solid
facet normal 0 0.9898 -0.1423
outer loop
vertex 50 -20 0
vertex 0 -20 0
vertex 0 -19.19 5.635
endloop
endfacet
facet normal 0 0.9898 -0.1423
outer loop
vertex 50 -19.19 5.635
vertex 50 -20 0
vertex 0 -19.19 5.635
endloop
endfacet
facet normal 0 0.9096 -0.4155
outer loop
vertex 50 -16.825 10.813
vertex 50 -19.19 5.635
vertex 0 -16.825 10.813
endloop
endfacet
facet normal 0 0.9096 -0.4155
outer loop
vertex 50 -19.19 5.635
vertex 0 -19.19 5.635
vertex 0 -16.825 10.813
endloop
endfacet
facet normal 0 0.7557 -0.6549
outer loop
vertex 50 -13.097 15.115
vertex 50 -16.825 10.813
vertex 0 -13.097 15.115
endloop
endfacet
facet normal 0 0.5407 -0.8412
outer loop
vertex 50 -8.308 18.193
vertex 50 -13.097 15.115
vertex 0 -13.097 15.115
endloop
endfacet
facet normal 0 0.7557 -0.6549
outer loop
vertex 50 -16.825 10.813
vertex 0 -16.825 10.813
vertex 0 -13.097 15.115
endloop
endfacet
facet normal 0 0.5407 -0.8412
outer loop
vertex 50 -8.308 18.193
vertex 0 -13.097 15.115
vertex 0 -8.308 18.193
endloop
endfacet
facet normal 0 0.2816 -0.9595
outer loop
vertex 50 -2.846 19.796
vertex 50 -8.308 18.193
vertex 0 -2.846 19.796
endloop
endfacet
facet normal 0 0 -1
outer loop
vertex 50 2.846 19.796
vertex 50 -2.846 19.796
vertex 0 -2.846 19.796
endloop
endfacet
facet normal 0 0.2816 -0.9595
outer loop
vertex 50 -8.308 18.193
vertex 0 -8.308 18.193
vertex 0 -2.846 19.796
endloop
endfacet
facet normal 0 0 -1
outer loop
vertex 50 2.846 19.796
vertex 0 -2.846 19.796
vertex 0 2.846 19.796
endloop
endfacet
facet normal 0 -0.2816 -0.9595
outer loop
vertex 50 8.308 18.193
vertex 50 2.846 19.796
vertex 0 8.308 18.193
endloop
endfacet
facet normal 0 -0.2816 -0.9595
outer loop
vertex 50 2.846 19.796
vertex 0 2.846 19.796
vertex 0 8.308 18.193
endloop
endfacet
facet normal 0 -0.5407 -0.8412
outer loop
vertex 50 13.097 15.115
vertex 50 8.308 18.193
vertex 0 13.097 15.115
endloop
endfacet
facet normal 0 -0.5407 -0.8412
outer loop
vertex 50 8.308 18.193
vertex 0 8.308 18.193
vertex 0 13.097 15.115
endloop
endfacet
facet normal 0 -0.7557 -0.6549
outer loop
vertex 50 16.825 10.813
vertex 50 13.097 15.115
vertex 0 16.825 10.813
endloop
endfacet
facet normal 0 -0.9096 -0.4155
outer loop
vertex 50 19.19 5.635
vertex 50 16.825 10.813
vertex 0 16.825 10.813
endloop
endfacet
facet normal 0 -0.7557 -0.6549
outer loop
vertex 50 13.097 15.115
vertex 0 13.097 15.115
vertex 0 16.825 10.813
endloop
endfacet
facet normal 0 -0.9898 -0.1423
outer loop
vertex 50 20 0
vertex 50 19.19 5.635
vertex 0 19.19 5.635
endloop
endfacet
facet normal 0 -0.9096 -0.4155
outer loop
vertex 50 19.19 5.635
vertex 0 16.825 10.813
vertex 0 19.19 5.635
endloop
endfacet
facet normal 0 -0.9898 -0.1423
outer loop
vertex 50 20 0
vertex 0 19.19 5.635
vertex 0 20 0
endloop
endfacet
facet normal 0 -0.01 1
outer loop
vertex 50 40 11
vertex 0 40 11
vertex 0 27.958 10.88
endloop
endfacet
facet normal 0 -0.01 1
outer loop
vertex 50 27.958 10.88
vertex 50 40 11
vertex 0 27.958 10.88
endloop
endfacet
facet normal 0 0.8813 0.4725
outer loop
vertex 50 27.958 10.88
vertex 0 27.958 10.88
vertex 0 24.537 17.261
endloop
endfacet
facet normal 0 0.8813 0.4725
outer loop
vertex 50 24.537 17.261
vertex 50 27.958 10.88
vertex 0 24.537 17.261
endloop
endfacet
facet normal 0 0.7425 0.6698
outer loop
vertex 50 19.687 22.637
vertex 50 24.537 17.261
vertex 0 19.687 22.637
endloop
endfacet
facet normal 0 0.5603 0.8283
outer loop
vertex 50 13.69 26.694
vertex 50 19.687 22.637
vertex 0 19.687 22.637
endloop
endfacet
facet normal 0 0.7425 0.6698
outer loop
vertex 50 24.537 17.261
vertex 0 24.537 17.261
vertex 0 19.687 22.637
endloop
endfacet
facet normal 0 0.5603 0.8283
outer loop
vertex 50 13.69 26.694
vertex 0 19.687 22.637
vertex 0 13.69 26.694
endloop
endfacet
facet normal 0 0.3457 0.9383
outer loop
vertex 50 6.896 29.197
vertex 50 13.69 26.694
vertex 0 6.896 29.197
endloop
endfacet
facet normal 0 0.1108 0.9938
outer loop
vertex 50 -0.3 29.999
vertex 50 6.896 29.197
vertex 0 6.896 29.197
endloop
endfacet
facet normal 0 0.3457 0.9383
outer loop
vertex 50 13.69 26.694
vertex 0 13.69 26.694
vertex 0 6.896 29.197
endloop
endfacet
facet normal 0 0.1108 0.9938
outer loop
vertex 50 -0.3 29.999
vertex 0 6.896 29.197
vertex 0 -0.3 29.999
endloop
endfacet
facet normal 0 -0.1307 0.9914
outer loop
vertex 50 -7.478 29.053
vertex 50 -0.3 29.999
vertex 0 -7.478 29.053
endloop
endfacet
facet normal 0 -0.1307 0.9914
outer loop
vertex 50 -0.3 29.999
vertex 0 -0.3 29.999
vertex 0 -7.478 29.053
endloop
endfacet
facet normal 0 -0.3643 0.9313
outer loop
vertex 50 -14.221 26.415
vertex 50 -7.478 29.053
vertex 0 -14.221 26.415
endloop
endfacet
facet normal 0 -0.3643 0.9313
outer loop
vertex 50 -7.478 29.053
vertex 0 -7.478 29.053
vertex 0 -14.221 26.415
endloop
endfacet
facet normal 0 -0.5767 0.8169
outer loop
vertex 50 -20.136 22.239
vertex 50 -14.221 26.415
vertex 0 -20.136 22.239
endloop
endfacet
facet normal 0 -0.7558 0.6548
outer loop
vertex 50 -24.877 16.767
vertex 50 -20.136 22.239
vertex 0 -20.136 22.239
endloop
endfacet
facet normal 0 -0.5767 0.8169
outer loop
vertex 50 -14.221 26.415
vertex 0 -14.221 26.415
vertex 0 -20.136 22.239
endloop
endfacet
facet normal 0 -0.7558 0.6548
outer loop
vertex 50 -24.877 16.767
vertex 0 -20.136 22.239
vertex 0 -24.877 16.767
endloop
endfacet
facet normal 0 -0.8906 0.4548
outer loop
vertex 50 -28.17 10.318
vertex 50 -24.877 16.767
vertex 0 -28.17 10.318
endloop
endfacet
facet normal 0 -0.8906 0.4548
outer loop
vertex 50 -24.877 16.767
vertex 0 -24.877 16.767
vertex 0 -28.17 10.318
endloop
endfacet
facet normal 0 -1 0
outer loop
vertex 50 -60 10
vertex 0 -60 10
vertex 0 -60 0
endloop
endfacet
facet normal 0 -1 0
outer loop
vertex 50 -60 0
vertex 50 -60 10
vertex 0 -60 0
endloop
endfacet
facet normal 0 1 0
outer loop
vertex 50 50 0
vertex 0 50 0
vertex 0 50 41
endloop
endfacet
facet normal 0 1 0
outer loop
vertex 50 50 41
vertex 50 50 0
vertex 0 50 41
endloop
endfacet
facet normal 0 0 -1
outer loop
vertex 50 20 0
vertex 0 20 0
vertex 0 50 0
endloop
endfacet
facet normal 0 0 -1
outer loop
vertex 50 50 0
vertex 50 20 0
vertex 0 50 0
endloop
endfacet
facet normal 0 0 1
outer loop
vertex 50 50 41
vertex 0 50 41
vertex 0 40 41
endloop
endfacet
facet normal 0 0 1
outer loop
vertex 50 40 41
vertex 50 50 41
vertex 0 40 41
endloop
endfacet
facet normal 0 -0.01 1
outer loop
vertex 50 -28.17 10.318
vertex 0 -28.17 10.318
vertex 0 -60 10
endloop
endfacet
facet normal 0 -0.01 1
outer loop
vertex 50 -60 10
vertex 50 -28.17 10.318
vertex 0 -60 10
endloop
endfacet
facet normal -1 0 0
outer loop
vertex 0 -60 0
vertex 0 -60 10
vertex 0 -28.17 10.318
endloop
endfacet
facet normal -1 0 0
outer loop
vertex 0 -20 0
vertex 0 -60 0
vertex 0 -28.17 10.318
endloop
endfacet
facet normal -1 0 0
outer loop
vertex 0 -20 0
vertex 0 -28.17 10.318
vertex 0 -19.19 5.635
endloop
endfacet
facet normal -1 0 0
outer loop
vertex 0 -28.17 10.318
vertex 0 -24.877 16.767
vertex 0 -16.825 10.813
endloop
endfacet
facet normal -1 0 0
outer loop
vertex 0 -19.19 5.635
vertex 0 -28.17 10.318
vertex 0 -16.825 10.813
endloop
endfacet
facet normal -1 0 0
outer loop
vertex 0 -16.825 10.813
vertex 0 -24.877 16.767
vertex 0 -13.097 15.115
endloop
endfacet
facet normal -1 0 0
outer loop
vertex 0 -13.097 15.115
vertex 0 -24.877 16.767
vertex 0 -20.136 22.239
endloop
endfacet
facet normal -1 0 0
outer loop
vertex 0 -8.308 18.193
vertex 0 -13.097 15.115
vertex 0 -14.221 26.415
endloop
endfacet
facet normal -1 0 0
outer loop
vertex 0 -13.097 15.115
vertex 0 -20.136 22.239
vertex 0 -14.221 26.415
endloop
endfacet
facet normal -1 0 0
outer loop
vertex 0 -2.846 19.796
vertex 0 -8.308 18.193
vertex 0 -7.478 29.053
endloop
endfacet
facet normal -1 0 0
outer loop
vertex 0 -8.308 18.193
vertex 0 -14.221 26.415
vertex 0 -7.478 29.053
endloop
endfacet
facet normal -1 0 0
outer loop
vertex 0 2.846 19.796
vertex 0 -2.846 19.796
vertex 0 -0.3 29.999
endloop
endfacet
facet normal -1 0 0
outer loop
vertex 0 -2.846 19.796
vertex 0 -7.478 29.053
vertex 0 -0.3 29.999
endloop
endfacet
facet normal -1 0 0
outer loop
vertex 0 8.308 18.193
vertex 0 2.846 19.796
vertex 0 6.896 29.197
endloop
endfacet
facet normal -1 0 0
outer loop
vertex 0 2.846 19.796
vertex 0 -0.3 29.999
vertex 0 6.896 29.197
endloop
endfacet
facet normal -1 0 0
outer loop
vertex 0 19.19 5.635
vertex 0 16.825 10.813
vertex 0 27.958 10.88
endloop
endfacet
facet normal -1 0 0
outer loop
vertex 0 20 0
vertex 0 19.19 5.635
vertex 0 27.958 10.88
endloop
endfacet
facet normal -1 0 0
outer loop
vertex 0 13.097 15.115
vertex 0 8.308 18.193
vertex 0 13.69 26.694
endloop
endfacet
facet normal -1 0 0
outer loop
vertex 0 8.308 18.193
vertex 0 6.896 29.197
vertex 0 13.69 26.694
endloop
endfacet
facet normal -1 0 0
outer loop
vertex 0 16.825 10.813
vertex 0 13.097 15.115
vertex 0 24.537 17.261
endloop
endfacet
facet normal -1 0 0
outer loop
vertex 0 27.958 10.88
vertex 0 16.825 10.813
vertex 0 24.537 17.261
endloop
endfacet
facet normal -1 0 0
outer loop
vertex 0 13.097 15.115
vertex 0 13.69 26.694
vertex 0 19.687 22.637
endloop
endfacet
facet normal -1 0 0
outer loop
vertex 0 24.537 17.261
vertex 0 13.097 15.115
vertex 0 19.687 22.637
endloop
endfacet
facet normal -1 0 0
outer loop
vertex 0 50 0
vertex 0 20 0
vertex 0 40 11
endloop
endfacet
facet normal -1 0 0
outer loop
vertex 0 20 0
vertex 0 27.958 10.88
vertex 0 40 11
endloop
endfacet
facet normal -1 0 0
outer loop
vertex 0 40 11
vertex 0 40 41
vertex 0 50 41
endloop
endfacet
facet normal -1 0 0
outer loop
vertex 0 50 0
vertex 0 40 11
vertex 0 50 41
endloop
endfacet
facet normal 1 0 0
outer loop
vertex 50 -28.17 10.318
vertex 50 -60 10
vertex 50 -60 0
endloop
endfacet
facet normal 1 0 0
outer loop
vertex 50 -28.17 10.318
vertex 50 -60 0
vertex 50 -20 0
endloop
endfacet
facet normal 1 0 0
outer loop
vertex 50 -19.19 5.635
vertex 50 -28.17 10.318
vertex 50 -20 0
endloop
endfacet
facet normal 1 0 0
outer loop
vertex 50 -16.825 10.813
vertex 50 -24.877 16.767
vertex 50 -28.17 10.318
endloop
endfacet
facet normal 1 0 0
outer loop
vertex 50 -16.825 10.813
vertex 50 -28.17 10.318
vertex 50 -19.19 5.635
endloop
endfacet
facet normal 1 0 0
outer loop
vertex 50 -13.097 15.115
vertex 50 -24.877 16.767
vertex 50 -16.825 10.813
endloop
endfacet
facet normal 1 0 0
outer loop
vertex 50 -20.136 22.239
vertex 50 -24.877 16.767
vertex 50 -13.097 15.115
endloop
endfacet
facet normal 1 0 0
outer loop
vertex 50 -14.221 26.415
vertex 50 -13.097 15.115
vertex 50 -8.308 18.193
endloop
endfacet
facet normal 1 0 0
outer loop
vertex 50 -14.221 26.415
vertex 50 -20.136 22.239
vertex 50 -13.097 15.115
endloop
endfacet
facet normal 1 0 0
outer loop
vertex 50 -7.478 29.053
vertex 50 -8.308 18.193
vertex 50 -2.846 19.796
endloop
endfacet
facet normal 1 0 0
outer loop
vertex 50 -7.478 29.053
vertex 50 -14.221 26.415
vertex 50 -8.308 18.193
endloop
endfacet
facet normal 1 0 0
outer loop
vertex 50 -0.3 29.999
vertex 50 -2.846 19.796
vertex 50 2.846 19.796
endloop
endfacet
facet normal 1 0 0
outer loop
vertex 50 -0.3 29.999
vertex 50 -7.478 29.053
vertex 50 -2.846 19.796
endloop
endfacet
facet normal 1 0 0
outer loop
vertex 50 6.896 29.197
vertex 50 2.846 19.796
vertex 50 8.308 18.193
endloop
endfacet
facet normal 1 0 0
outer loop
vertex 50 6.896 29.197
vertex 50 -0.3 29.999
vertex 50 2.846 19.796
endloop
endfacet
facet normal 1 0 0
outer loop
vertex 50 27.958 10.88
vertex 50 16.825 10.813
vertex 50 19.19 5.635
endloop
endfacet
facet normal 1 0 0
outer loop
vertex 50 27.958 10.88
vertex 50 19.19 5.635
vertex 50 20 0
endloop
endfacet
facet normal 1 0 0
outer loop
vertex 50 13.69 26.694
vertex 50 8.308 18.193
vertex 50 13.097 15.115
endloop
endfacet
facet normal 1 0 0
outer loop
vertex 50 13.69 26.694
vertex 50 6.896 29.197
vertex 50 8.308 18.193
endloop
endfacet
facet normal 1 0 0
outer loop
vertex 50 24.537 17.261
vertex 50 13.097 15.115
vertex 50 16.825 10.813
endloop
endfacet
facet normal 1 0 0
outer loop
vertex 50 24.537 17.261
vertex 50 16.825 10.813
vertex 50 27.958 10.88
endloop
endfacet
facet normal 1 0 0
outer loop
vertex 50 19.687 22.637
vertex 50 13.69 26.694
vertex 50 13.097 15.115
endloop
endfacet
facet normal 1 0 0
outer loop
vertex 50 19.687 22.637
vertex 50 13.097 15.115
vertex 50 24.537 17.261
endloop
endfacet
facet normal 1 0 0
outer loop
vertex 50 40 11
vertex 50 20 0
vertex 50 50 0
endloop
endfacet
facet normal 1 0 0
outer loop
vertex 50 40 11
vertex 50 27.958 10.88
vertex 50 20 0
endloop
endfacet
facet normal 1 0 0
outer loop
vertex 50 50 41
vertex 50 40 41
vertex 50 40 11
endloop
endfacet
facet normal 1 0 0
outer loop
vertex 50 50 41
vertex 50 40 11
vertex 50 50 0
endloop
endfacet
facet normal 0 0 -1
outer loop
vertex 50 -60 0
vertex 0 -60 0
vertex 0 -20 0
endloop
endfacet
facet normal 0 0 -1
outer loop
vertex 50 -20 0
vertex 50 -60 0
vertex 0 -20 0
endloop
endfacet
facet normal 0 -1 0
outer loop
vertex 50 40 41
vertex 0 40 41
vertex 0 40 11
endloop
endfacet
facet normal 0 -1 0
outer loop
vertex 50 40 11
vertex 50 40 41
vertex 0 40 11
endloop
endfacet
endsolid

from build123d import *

# Parameters (mm, degrees)
F1_DEPTH = 50


# Not quite as in the source:
# - a feature names something its author has since deleted; it is built from what else it names


with BuildPart() as f1:
    # F0 (on Right) → F1 (new body)
    with BuildSketch(Plane.YZ):
        with BuildLine():
            Line((20.0000005408, 0), (50, 0))
            Line((50, 0), (50, 41))
            Line((50, 41), (40, 41))
            Line((40, 41), (40, 11))
            Line((40, 11), (27.9577328728, 10.8795773287))
            ThreePointArc((27.9577328728, 10.8795773287), (-0.2999844603, 29.9985001125), (-28.1697105934, 10.3183028941))
            Line((-28.1697105934, 10.3183028941), (-60, 10))
            Line((-60, 10), (-60, 0))
            Line((-60, 0), (-19.9999994592, 0))
            ThreePointArc((-19.9999994592, 0), (5.408e-07, 20), (20.0000005408, 0))
        make_face()
    extrude(amount=F1_DEPTH)


solid = f1.part
